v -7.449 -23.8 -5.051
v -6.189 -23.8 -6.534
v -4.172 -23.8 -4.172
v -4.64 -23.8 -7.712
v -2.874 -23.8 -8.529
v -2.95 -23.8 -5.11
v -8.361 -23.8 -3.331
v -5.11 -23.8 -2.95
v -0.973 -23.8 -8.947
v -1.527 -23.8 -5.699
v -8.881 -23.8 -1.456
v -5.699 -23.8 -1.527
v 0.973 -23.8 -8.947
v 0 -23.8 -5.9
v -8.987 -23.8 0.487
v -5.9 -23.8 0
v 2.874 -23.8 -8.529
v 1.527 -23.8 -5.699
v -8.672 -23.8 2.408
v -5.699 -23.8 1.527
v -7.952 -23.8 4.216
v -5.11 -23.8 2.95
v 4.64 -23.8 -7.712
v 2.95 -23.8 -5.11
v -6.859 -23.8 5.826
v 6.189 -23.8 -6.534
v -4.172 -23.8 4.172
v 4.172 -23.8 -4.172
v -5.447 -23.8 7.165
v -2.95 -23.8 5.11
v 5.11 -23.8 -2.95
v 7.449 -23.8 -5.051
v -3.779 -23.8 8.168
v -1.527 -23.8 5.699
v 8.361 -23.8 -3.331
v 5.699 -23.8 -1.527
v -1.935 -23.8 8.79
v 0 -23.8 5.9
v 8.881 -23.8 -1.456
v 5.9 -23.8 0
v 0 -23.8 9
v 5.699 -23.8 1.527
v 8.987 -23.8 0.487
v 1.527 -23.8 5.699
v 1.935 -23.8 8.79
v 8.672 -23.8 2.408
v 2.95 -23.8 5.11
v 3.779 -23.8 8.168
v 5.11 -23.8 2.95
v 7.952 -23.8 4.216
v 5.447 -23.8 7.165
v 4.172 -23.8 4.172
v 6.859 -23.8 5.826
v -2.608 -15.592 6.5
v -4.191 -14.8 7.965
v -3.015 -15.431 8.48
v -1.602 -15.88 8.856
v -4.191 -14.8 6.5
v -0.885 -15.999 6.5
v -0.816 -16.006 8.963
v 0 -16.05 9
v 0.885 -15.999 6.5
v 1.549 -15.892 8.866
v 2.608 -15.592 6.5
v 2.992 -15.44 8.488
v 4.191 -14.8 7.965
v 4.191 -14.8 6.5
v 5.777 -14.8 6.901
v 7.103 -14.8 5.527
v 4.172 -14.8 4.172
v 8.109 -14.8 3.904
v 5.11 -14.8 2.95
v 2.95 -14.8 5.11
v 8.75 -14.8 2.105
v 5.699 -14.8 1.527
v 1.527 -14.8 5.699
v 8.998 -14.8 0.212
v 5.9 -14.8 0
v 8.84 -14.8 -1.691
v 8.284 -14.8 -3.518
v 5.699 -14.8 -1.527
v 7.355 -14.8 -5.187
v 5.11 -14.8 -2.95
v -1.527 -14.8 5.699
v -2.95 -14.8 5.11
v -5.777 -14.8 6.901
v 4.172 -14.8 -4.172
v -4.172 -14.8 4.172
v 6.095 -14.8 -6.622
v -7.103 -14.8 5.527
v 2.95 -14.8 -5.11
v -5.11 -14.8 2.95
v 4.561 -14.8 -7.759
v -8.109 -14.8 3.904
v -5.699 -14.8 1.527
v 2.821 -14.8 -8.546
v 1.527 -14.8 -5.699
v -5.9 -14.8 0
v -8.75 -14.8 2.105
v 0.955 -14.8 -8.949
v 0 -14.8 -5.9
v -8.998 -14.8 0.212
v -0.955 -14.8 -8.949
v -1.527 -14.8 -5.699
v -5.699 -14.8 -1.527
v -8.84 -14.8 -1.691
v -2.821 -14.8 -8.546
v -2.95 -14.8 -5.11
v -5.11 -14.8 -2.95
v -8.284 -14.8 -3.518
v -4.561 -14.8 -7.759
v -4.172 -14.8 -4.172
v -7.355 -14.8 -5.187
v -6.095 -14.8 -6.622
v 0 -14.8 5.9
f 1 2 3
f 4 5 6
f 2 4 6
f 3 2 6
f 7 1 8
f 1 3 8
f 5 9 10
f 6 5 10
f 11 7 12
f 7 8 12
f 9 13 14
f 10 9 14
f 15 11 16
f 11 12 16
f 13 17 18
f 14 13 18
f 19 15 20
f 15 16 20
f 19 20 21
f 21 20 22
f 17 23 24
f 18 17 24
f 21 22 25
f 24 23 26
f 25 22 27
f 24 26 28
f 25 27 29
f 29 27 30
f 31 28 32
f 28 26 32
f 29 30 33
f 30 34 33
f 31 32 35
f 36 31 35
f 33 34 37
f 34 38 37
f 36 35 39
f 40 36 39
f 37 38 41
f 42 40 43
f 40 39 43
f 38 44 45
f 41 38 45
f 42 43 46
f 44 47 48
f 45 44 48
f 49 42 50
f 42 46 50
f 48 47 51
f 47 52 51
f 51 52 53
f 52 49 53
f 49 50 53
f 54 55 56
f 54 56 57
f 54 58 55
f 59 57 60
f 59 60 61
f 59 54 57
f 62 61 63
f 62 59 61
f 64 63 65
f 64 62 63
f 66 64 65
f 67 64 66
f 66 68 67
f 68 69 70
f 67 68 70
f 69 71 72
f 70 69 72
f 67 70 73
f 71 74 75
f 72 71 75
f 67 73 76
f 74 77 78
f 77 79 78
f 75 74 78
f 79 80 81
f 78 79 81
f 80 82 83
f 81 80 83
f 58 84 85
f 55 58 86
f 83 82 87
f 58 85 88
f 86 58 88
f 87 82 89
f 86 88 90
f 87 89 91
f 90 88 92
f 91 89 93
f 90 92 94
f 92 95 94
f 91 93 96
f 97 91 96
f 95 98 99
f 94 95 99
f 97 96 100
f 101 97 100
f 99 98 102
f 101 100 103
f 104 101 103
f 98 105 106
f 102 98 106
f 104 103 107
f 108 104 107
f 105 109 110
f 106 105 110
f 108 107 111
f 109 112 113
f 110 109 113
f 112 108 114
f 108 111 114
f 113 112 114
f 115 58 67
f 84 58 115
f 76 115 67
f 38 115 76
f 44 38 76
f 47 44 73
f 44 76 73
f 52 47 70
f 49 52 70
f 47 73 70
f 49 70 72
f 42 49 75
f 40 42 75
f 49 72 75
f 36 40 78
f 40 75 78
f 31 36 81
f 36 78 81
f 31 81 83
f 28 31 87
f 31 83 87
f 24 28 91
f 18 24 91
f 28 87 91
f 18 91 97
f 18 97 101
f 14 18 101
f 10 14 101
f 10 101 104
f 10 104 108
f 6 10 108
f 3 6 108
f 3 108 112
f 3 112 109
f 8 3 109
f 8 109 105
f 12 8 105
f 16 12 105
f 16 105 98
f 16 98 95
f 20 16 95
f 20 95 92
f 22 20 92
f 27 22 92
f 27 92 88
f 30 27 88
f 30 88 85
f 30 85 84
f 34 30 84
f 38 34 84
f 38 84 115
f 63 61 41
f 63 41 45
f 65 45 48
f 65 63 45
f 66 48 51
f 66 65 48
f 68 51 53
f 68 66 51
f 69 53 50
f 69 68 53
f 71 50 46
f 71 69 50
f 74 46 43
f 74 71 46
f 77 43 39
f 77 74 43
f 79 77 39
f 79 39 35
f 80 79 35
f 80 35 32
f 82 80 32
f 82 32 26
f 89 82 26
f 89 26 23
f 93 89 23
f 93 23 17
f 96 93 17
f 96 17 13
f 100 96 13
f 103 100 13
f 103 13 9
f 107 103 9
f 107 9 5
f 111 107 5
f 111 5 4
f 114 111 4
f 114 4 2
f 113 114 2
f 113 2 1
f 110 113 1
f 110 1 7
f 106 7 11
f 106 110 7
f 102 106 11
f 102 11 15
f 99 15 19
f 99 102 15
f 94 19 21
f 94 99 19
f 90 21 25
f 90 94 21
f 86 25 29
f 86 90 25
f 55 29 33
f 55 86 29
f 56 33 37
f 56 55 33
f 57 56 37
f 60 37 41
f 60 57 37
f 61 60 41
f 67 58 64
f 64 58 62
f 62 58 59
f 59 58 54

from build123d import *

# Parameters (mm, degrees)
SKETCH1_R               = 9
SKETCH1_R_2             = 5.9
BOSS_EXTRUDE1_DEPTH     = 23.8
CUT_EXTRUDE5_START      = 6.5
SKETCH3_R               = 7.65
CUT_EXTRUDE5_DEPTH      = 21.489627637
CUT_EXTRUDE6_DEPTH      = 30.7941271
CUT_EXTRUDE6_DEPTH_BACK = 7
SKETCH6_R               = 5.5
SKETCH7_R               = 13.484313598
CUT_EXTRUDE7_DEPTH      = 20.520246068


with BuildPart() as part:
    # Sketch1 → Boss-Extrude1 (new body)
    with BuildSketch(Plane(origin=(0, 0, 0), x_dir=(1, 0, 0), z_dir=(0, 1, 0))):
        with Locations(Location((0, 0, 0), (0, 0, 270))):
            Circle(SKETCH1_R)
        with Locations(Location((0, 0, 0), (0, 0, 270))):
            Circle(SKETCH1_R_2, mode=Mode.SUBTRACT)
    extrude(amount=-BOSS_EXTRUDE1_DEPTH)

    # Sketch3 → Cut-Extrude5 (cut, through all)
    with BuildSketch(Plane.XY.offset(CUT_EXTRUDE5_START)):
        with Locations((0, -8.4)):
            Circle(SKETCH3_R)
    extrude(amount=CUT_EXTRUDE5_DEPTH, mode=Mode.SUBTRACT)

    # Sketch6 → Cut-Extrude6 (cut, two sides: drawn at the far end of the back side and taken through both)
    with BuildSketch(Plane.XY.offset(6.5).offset(-CUT_EXTRUDE6_DEPTH_BACK)):
        with Locations(Location((0.145476138, -8.4, 0), (0, 0, 91.515662264))):
            Circle(SKETCH6_R)
    extrude(amount=CUT_EXTRUDE6_DEPTH + CUT_EXTRUDE6_DEPTH_BACK, mode=Mode.SUBTRACT)

    # Sketch7 → Cut-Extrude7 (cut, through all)
    with BuildSketch(Plane(origin=(0, -14.8, 0), x_dir=(-1, 0, 0), z_dir=(0, -1, 0))):
        Circle(SKETCH7_R)
    extrude(amount=-CUT_EXTRUDE7_DEPTH, mode=Mode.SUBTRACT)


solid = part.part
